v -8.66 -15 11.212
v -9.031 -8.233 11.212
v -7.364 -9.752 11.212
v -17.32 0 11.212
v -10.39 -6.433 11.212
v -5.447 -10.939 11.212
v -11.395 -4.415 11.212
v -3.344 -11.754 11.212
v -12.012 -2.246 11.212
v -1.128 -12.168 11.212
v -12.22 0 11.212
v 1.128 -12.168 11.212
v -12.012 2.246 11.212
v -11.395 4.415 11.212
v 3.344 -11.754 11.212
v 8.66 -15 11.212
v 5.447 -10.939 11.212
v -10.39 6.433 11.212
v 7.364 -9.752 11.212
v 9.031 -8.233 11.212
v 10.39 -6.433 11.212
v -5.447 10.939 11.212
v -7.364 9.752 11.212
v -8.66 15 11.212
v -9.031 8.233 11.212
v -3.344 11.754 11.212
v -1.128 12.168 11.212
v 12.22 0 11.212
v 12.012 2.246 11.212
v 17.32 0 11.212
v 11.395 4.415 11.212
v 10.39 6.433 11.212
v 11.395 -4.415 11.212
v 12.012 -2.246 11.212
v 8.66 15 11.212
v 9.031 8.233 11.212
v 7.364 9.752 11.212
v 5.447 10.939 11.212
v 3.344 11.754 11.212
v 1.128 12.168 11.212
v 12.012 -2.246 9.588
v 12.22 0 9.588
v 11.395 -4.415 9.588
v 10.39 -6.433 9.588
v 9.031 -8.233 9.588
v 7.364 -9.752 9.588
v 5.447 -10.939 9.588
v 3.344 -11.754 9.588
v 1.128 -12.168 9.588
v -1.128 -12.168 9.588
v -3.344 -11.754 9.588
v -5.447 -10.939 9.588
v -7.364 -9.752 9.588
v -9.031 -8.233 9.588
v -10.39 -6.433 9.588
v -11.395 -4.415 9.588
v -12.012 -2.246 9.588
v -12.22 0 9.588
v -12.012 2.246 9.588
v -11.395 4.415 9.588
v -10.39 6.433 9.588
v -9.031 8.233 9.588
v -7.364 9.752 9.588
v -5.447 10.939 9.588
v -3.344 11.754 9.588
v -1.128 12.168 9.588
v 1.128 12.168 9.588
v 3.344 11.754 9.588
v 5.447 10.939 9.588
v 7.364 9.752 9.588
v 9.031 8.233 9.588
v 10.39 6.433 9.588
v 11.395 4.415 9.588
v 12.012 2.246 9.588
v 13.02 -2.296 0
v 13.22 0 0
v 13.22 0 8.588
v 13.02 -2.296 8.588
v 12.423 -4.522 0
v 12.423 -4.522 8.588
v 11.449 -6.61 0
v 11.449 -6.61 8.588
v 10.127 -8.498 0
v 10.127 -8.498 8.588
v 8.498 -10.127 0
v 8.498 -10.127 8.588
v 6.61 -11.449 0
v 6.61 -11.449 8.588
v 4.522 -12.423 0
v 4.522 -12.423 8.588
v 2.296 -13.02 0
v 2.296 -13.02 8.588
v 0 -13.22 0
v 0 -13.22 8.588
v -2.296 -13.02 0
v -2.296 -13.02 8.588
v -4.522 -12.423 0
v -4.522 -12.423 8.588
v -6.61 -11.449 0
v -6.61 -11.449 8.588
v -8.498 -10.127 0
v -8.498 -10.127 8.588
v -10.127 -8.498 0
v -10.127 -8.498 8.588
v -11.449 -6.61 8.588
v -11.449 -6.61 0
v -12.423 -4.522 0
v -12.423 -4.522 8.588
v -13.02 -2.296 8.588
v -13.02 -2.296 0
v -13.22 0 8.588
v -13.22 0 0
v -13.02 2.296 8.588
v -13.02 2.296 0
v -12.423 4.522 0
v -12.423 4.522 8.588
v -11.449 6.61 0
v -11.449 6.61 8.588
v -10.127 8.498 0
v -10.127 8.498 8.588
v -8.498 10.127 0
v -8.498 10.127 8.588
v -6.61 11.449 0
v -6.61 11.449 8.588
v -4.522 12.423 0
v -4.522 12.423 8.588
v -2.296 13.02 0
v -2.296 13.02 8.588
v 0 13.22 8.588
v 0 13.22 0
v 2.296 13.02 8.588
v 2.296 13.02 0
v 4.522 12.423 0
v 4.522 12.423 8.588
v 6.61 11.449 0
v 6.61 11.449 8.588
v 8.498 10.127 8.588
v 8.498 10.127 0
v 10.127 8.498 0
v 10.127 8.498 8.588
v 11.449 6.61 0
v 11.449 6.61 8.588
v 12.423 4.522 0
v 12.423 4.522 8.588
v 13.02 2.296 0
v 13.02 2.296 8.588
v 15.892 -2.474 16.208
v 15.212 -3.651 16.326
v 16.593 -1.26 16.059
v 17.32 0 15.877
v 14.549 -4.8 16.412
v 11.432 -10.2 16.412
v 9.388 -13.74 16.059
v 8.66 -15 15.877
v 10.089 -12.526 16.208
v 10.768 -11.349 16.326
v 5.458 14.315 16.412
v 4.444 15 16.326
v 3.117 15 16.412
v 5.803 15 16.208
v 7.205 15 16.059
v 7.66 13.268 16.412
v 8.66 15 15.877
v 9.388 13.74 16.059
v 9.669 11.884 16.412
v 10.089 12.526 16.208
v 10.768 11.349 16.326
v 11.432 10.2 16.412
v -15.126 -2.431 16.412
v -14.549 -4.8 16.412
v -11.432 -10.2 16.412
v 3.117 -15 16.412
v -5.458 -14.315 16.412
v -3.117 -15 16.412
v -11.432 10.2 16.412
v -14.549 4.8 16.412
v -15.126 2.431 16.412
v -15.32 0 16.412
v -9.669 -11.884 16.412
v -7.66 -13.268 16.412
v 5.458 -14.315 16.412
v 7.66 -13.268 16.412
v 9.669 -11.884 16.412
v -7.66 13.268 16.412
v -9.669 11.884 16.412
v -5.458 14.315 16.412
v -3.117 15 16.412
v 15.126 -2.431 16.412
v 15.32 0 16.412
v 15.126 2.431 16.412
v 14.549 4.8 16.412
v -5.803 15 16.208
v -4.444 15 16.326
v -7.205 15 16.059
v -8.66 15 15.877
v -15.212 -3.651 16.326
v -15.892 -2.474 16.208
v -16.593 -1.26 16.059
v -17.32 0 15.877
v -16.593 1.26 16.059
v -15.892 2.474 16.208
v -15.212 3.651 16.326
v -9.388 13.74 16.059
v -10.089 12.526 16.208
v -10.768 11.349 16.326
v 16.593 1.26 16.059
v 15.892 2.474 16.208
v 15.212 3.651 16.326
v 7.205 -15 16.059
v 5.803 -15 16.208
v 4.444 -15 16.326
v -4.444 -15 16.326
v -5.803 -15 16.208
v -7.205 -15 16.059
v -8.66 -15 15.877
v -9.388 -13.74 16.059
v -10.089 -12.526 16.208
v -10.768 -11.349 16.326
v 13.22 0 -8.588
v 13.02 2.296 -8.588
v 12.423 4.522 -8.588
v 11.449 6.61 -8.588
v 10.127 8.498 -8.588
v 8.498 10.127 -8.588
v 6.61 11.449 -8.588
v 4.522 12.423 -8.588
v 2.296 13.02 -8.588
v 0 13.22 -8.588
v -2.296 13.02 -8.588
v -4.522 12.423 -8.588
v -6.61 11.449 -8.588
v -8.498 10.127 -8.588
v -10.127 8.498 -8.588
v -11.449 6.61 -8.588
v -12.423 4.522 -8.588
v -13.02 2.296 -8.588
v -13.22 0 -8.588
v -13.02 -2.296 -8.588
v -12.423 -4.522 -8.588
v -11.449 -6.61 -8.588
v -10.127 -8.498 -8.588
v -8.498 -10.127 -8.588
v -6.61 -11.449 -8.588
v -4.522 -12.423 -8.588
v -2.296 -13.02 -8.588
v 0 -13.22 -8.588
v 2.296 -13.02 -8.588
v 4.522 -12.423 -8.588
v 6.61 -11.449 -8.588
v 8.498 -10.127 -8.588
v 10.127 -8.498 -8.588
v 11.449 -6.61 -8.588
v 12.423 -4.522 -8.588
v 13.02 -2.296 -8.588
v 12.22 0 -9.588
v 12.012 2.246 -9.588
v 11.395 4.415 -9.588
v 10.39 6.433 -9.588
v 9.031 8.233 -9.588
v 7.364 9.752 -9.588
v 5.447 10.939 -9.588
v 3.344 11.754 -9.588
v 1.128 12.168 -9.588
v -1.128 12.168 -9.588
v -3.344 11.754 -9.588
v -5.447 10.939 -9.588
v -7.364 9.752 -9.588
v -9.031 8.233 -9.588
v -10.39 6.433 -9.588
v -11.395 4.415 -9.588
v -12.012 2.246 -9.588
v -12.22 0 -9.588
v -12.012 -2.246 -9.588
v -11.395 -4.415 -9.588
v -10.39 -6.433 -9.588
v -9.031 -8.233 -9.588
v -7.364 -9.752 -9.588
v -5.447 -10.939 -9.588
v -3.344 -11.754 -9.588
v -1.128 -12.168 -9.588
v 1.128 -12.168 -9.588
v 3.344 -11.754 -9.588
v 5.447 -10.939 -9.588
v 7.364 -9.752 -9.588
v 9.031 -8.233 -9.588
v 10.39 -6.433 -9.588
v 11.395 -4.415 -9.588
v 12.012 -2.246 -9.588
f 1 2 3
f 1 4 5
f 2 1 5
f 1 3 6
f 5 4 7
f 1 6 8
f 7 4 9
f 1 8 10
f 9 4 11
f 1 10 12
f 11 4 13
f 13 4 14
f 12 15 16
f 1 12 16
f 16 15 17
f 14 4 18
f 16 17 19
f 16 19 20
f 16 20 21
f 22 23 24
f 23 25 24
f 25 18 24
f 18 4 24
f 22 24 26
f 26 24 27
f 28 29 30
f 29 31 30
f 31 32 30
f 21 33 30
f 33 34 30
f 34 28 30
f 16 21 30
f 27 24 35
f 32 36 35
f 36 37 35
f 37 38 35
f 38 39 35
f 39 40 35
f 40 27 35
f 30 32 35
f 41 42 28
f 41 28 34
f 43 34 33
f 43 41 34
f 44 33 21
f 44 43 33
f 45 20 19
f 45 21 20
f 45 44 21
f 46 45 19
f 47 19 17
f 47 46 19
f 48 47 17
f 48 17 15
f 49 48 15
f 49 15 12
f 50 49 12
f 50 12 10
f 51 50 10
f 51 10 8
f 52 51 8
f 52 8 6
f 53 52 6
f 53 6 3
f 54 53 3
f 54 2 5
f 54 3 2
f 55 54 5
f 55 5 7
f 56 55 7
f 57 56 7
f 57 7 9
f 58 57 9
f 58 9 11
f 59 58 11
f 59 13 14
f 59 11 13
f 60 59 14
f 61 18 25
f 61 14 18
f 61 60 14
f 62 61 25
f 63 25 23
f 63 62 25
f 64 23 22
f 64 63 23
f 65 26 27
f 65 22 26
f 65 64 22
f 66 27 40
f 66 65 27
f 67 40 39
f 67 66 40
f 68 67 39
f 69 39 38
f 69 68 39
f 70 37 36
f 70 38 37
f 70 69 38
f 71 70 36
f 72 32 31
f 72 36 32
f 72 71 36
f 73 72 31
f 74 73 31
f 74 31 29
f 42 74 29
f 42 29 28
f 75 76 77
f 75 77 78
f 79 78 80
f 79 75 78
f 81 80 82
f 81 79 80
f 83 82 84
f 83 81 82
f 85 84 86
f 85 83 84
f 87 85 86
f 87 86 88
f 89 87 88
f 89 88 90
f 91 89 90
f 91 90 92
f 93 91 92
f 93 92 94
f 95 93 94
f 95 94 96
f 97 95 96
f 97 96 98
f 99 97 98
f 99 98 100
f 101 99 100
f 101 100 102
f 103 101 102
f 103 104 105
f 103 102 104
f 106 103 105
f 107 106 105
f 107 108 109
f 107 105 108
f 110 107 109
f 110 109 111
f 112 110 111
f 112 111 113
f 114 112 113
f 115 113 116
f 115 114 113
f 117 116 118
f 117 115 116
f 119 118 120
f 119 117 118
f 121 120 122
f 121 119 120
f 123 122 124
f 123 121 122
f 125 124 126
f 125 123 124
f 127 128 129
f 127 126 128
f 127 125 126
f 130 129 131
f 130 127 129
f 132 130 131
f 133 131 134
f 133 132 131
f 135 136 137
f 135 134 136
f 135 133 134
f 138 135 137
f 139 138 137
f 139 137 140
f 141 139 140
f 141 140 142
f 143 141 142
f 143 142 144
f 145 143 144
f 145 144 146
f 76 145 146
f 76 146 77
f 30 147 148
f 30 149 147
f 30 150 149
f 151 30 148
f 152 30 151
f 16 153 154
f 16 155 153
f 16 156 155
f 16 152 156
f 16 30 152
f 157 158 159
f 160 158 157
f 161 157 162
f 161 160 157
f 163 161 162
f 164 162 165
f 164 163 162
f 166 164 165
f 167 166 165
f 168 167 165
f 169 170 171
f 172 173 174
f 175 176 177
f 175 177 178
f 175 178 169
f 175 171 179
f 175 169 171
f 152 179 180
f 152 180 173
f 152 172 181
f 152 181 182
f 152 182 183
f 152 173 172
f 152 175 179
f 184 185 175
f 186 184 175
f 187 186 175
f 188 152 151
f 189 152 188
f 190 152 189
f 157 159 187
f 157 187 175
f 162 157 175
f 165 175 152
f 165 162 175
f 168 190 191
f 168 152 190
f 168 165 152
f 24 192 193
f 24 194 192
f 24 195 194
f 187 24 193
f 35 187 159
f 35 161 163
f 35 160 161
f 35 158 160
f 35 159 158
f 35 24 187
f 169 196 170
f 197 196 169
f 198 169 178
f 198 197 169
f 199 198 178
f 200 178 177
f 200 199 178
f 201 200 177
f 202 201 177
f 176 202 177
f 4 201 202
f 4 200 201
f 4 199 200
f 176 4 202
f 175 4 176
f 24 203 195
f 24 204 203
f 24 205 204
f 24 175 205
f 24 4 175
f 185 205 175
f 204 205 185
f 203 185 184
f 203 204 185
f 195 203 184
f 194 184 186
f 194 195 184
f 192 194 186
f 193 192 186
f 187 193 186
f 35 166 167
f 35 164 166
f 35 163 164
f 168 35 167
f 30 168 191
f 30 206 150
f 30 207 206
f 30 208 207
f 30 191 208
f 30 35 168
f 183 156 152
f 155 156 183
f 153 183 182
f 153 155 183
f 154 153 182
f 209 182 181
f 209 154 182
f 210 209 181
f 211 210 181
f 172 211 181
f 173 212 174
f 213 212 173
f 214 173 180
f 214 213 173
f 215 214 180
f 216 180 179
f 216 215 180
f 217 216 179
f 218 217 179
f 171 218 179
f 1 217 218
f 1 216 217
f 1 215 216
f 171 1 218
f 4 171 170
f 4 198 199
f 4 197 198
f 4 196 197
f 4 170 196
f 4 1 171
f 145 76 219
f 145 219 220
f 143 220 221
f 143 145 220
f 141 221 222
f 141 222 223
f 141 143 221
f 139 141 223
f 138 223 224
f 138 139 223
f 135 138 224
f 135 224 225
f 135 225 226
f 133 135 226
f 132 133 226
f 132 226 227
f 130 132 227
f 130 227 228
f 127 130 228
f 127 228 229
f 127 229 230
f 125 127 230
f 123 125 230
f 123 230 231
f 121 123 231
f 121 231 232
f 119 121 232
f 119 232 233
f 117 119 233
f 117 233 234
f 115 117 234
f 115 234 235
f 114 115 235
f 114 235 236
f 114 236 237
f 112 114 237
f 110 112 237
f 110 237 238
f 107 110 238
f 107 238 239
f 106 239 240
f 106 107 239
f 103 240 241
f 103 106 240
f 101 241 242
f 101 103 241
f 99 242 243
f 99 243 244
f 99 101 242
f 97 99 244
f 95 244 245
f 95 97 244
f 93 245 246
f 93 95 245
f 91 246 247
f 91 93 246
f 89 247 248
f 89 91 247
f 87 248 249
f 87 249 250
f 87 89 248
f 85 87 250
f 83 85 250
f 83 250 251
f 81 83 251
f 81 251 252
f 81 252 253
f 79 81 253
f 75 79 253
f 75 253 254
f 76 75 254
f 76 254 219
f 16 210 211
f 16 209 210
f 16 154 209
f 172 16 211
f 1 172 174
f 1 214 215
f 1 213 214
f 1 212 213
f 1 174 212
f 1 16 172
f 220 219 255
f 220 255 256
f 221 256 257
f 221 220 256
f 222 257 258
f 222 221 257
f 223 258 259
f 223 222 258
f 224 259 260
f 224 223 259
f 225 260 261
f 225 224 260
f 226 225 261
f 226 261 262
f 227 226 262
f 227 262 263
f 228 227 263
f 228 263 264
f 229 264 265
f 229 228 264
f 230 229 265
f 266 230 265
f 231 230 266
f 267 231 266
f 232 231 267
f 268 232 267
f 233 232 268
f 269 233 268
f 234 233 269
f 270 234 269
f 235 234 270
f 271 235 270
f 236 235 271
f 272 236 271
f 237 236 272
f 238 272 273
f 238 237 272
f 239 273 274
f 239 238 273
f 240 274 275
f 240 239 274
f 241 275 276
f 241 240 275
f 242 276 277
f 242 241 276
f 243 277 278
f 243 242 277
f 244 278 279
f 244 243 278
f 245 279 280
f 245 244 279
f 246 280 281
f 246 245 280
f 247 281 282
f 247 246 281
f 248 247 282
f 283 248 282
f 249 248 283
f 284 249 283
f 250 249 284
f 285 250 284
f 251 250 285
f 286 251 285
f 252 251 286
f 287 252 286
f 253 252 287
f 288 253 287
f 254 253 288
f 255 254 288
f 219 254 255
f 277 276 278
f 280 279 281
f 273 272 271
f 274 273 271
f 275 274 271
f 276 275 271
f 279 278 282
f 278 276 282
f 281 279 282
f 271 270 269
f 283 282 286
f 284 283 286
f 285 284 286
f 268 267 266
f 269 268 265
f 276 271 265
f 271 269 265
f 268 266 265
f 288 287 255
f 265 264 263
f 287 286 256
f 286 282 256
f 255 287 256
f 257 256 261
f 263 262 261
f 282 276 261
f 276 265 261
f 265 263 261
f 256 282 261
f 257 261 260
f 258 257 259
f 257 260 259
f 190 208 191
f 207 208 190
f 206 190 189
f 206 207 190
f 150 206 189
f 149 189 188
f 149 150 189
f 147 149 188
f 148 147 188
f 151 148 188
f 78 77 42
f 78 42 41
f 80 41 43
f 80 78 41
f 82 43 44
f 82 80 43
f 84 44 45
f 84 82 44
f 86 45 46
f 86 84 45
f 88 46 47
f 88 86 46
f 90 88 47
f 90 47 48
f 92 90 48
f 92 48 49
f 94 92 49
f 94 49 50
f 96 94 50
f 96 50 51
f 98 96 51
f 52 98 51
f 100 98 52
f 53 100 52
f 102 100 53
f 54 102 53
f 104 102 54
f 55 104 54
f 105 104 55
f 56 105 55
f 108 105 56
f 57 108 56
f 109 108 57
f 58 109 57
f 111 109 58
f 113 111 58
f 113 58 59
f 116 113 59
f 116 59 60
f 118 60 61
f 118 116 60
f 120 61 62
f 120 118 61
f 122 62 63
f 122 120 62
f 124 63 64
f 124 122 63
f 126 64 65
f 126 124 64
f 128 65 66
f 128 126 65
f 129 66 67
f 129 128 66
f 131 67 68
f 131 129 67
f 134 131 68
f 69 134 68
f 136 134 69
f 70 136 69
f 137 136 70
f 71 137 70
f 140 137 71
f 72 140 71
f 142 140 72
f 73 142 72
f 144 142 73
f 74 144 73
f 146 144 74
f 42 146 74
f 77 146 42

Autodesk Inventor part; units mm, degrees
ref_plane "YZ Plane" through (0, 0, 0) normal (1, 0, 0) x (0, 1, 0)
ref_plane "XZ Plane" through (0, 0, 0) normal (0, 1, 0) x (-1, 0, 0)
ref_plane "XY Plane" through (0, 0, 0) normal (0, 0, 1) x (1, 0, 0)
sketch "Szkic7" plane through (0, 0, 0) normal (0, 0, 1) x (1, 0, 0)
  circle A0 centre (0, 0) radius 13.2205
  dimension "d35" = 26.441
extrude "Wyciągnięcie proste2" add sketch "Szkic7" along normal mid plane 19.175
chamfer "Faza2" distance 1 angle 45 1 edges at (-13.2205, 0, 9.5875)
sketch "Szkic9" plane through (0, 0, 9.5875) normal (0, 0, 1) x (1, 0, 0)
  circle A0 centre (0, 0) radius 12.2205 projected
extrude "Wyciągnięcie proste3" add sketch "Szkic9" along normal blind 1.625
sketch "Szkic10" plane through (0, 0, 11.2125) normal (0, 0, 1) x (1, 0, 0)
  line L0 (-8.6603, 15) -> (8.6603, 15)
  line L1 (8.6603, 15) -> (17.3205, 0)
  line L2 (17.3205, 0) -> (8.6603, -15)
  line L3 (8.6603, -15) -> (-8.6603, -15)
  line L4 (-8.6603, -15) -> (-17.3205, 0)
  line L5 (-17.3205, 0) -> (-8.6603, 15)
  line L6 (0, 18.5087) -> (0, -18.5087) construction
  line L7 (-18.5087, 0) -> (18.5087, 0) construction
  point P0 (0, 0)
  point P1 (0, 0)
  point P2 (0, 15)
  dimension "d44" = 30
extrude "Wyciągnięcie proste4" add sketch "Szkic10" along normal blind 5.2
sketch "Szkic12" plane through (0, 0, 0) normal (0, 1, 0) x (-1, 0, 0)
  line L0 (0, -2.1463) -> (0, 12.8775) construction
  line L1 (-8.6603, 11.2125) -> (-8.6603, 16.4125) construction
  line L2 (-17.3205, 16.4125) -> (-8.6603, 16.4125) construction
  line L3 (-17.3205, 11.2125) -> (-17.3205, 16.4125) projected
  line L4 (-17.3205, 15.8766) -> (-15.3205, 16.4125)
  line L5 (-17.3205, 16.4125) -> (-8.6603, 16.4125) projected
  line L6 (-17.3205, 11.2125) -> (-8.6603, 11.2125) projected
  point P0 (0, 0)
  dimension "d50" = 15
  dimension "d51" = 2
revolve "Obrót2" cut sketch "Szkic12" angle 360 about axis through (0, 0, -10) along (0, 0, 1)
thread "Gwint3" size "G26.441x1.814" designation "G 3/4" class "A" standard "ISO Pipe Threads" full length
chamfer "Faza3" distance 1 angle 45 1 edges at (-13.2205, 0, -9.5875)
equation "\"d35\" = OD"
equation "\"d36\" = 0.7375 * L"
equation "\"d42\" = 0.0625 * L"
equation "\"d44\" = SW"
equation "\"d45\" = 0.2 * L"
equation "\"d51\" = 0.0666667 * SW"
equation "\"SzerokośćGięciaPodcięcia\" = Grubość"
equation "\"RozmiarPodcięciaNarożnika\" = 4 * Grubość"
equation "\"PromieńPrzejścia\" = PromieńGięcia"
equation "\"Rozmiar_promienia_Jacobiego\" = PromieńGięcia"
equation "\"Wielk_odstępu\" = Grubość"
equation "\"d2\" = PromieńGięcia"
equation "\"d23\" = PromieńGięcia"
equation "\"OD\" = 26.441"
equation "\"SW\" = 30"
equation "\"L\" = 26"
equation "\"Grubość\" = 1.5"
equation "\"PromieńGięcia\" = 3"
properties part number "Korek sześciokątny BSP 3/4'' L=26" material "304"
